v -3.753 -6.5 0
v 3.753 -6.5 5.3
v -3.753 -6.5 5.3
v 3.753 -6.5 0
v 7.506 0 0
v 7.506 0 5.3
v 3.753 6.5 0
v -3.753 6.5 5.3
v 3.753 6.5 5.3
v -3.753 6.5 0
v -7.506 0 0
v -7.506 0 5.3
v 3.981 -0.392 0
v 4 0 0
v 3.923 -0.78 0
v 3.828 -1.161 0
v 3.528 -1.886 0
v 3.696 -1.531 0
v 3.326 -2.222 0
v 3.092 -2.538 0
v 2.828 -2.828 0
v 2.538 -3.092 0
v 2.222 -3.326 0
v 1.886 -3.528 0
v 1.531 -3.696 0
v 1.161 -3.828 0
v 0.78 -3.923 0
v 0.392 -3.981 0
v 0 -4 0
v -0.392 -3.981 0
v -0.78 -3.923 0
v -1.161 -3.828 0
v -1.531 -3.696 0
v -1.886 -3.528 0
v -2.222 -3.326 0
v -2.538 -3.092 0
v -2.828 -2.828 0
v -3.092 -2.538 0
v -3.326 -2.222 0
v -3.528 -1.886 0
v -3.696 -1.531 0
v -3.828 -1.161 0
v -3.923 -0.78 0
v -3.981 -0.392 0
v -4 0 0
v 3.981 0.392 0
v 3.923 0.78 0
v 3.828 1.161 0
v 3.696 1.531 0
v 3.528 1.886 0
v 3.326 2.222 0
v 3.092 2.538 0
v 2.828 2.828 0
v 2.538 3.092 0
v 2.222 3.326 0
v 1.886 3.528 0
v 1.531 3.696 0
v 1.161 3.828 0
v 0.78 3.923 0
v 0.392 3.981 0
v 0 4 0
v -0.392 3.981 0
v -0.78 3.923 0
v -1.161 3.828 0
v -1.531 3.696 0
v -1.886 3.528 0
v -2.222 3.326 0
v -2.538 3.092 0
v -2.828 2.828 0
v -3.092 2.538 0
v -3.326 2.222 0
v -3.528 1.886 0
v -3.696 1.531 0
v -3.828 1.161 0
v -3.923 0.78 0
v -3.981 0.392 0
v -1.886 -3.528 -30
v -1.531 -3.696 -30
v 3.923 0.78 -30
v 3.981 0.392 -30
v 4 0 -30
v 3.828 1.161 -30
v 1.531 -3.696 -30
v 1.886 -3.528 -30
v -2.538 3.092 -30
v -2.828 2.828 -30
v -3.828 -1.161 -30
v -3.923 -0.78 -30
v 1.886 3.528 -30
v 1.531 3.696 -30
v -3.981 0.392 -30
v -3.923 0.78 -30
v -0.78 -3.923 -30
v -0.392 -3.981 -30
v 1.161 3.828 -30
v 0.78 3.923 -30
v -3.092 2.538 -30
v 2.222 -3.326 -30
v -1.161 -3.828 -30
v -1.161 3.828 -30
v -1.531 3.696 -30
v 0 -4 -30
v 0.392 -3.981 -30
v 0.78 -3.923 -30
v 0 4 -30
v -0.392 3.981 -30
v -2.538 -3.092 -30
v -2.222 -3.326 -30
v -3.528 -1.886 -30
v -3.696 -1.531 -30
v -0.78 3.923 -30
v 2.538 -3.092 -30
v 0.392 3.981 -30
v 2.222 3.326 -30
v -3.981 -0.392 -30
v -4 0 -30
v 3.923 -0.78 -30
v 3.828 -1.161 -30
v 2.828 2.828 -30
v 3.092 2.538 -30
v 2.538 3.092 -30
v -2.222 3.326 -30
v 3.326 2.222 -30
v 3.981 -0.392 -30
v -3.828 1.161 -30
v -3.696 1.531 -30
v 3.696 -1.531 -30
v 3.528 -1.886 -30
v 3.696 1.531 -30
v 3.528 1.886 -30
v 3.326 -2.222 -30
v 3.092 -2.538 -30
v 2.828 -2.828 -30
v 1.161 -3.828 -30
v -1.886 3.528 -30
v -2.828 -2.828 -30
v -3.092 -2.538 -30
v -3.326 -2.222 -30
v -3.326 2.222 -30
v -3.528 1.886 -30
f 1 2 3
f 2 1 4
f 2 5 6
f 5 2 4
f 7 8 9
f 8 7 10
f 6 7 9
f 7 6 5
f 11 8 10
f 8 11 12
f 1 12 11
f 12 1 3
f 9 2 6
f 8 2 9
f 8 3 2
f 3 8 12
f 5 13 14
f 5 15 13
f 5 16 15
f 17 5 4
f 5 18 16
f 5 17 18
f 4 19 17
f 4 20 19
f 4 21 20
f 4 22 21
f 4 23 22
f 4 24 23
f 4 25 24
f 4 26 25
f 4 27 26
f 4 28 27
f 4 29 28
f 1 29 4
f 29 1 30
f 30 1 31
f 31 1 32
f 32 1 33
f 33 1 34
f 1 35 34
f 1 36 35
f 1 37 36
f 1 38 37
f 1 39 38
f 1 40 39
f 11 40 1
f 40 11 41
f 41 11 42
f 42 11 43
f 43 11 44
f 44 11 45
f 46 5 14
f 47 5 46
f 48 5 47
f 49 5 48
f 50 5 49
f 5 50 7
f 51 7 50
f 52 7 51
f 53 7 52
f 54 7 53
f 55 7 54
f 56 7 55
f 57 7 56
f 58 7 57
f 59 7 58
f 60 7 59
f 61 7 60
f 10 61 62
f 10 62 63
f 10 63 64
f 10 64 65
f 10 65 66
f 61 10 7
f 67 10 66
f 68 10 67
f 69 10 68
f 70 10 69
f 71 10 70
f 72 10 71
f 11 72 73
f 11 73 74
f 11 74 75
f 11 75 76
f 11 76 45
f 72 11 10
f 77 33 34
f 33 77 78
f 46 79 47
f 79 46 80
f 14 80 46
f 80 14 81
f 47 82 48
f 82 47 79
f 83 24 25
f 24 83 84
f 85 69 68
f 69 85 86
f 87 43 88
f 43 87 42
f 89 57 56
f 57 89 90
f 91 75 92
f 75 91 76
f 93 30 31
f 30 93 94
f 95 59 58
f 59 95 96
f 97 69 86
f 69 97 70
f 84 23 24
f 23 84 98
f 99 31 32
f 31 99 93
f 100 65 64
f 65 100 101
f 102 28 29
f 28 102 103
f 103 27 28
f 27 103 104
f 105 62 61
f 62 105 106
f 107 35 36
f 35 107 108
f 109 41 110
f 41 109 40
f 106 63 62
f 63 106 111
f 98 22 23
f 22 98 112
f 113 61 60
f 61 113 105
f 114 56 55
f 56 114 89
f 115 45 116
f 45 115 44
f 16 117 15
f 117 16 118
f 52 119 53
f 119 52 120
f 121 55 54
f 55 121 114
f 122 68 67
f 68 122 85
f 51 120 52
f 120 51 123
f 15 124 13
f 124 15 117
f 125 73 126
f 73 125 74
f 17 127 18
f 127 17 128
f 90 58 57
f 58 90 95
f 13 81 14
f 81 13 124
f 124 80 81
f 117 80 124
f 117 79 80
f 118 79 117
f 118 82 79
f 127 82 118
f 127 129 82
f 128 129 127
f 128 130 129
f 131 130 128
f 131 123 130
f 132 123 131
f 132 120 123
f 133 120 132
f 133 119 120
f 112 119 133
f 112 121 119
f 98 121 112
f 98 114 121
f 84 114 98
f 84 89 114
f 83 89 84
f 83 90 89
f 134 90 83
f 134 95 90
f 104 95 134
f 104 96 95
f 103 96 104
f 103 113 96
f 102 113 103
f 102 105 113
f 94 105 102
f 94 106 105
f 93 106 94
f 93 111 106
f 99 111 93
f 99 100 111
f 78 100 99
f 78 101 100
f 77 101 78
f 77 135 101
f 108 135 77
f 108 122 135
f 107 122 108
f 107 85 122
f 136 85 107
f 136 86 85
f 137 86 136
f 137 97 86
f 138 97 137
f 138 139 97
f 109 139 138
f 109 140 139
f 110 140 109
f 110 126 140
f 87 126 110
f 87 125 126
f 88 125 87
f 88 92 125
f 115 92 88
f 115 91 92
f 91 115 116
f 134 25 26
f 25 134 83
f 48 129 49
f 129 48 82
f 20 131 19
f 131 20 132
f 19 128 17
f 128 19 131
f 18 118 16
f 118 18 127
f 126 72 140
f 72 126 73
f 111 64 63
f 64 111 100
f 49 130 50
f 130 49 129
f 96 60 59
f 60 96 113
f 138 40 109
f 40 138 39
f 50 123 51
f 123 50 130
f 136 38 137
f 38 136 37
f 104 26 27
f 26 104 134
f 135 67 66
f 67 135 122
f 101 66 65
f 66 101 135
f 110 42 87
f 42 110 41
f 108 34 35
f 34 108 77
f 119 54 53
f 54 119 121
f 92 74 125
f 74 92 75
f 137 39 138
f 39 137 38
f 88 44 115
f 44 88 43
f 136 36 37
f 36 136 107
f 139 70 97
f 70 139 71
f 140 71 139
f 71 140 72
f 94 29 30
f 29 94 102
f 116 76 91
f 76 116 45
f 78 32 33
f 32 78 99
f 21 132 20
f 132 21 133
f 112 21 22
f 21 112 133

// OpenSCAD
// M8 六角ボルト(ねじ山省略)
$fn = 64;

af = 13;          // 対辺距離
head_h = 5.3;     // 頭部高さ
shank_d = 8;      // シャンク直径
shank_l = 30;     // シャンク長さ

// 頭部(六角柱): 底面が z=0
cylinder(h = head_h, d = af / cos(30), $fn = 6);

// シャンク: z<0 方向へ
translate([0, 0, -shank_l])
    cylinder(h = shank_l, d = shank_d);
